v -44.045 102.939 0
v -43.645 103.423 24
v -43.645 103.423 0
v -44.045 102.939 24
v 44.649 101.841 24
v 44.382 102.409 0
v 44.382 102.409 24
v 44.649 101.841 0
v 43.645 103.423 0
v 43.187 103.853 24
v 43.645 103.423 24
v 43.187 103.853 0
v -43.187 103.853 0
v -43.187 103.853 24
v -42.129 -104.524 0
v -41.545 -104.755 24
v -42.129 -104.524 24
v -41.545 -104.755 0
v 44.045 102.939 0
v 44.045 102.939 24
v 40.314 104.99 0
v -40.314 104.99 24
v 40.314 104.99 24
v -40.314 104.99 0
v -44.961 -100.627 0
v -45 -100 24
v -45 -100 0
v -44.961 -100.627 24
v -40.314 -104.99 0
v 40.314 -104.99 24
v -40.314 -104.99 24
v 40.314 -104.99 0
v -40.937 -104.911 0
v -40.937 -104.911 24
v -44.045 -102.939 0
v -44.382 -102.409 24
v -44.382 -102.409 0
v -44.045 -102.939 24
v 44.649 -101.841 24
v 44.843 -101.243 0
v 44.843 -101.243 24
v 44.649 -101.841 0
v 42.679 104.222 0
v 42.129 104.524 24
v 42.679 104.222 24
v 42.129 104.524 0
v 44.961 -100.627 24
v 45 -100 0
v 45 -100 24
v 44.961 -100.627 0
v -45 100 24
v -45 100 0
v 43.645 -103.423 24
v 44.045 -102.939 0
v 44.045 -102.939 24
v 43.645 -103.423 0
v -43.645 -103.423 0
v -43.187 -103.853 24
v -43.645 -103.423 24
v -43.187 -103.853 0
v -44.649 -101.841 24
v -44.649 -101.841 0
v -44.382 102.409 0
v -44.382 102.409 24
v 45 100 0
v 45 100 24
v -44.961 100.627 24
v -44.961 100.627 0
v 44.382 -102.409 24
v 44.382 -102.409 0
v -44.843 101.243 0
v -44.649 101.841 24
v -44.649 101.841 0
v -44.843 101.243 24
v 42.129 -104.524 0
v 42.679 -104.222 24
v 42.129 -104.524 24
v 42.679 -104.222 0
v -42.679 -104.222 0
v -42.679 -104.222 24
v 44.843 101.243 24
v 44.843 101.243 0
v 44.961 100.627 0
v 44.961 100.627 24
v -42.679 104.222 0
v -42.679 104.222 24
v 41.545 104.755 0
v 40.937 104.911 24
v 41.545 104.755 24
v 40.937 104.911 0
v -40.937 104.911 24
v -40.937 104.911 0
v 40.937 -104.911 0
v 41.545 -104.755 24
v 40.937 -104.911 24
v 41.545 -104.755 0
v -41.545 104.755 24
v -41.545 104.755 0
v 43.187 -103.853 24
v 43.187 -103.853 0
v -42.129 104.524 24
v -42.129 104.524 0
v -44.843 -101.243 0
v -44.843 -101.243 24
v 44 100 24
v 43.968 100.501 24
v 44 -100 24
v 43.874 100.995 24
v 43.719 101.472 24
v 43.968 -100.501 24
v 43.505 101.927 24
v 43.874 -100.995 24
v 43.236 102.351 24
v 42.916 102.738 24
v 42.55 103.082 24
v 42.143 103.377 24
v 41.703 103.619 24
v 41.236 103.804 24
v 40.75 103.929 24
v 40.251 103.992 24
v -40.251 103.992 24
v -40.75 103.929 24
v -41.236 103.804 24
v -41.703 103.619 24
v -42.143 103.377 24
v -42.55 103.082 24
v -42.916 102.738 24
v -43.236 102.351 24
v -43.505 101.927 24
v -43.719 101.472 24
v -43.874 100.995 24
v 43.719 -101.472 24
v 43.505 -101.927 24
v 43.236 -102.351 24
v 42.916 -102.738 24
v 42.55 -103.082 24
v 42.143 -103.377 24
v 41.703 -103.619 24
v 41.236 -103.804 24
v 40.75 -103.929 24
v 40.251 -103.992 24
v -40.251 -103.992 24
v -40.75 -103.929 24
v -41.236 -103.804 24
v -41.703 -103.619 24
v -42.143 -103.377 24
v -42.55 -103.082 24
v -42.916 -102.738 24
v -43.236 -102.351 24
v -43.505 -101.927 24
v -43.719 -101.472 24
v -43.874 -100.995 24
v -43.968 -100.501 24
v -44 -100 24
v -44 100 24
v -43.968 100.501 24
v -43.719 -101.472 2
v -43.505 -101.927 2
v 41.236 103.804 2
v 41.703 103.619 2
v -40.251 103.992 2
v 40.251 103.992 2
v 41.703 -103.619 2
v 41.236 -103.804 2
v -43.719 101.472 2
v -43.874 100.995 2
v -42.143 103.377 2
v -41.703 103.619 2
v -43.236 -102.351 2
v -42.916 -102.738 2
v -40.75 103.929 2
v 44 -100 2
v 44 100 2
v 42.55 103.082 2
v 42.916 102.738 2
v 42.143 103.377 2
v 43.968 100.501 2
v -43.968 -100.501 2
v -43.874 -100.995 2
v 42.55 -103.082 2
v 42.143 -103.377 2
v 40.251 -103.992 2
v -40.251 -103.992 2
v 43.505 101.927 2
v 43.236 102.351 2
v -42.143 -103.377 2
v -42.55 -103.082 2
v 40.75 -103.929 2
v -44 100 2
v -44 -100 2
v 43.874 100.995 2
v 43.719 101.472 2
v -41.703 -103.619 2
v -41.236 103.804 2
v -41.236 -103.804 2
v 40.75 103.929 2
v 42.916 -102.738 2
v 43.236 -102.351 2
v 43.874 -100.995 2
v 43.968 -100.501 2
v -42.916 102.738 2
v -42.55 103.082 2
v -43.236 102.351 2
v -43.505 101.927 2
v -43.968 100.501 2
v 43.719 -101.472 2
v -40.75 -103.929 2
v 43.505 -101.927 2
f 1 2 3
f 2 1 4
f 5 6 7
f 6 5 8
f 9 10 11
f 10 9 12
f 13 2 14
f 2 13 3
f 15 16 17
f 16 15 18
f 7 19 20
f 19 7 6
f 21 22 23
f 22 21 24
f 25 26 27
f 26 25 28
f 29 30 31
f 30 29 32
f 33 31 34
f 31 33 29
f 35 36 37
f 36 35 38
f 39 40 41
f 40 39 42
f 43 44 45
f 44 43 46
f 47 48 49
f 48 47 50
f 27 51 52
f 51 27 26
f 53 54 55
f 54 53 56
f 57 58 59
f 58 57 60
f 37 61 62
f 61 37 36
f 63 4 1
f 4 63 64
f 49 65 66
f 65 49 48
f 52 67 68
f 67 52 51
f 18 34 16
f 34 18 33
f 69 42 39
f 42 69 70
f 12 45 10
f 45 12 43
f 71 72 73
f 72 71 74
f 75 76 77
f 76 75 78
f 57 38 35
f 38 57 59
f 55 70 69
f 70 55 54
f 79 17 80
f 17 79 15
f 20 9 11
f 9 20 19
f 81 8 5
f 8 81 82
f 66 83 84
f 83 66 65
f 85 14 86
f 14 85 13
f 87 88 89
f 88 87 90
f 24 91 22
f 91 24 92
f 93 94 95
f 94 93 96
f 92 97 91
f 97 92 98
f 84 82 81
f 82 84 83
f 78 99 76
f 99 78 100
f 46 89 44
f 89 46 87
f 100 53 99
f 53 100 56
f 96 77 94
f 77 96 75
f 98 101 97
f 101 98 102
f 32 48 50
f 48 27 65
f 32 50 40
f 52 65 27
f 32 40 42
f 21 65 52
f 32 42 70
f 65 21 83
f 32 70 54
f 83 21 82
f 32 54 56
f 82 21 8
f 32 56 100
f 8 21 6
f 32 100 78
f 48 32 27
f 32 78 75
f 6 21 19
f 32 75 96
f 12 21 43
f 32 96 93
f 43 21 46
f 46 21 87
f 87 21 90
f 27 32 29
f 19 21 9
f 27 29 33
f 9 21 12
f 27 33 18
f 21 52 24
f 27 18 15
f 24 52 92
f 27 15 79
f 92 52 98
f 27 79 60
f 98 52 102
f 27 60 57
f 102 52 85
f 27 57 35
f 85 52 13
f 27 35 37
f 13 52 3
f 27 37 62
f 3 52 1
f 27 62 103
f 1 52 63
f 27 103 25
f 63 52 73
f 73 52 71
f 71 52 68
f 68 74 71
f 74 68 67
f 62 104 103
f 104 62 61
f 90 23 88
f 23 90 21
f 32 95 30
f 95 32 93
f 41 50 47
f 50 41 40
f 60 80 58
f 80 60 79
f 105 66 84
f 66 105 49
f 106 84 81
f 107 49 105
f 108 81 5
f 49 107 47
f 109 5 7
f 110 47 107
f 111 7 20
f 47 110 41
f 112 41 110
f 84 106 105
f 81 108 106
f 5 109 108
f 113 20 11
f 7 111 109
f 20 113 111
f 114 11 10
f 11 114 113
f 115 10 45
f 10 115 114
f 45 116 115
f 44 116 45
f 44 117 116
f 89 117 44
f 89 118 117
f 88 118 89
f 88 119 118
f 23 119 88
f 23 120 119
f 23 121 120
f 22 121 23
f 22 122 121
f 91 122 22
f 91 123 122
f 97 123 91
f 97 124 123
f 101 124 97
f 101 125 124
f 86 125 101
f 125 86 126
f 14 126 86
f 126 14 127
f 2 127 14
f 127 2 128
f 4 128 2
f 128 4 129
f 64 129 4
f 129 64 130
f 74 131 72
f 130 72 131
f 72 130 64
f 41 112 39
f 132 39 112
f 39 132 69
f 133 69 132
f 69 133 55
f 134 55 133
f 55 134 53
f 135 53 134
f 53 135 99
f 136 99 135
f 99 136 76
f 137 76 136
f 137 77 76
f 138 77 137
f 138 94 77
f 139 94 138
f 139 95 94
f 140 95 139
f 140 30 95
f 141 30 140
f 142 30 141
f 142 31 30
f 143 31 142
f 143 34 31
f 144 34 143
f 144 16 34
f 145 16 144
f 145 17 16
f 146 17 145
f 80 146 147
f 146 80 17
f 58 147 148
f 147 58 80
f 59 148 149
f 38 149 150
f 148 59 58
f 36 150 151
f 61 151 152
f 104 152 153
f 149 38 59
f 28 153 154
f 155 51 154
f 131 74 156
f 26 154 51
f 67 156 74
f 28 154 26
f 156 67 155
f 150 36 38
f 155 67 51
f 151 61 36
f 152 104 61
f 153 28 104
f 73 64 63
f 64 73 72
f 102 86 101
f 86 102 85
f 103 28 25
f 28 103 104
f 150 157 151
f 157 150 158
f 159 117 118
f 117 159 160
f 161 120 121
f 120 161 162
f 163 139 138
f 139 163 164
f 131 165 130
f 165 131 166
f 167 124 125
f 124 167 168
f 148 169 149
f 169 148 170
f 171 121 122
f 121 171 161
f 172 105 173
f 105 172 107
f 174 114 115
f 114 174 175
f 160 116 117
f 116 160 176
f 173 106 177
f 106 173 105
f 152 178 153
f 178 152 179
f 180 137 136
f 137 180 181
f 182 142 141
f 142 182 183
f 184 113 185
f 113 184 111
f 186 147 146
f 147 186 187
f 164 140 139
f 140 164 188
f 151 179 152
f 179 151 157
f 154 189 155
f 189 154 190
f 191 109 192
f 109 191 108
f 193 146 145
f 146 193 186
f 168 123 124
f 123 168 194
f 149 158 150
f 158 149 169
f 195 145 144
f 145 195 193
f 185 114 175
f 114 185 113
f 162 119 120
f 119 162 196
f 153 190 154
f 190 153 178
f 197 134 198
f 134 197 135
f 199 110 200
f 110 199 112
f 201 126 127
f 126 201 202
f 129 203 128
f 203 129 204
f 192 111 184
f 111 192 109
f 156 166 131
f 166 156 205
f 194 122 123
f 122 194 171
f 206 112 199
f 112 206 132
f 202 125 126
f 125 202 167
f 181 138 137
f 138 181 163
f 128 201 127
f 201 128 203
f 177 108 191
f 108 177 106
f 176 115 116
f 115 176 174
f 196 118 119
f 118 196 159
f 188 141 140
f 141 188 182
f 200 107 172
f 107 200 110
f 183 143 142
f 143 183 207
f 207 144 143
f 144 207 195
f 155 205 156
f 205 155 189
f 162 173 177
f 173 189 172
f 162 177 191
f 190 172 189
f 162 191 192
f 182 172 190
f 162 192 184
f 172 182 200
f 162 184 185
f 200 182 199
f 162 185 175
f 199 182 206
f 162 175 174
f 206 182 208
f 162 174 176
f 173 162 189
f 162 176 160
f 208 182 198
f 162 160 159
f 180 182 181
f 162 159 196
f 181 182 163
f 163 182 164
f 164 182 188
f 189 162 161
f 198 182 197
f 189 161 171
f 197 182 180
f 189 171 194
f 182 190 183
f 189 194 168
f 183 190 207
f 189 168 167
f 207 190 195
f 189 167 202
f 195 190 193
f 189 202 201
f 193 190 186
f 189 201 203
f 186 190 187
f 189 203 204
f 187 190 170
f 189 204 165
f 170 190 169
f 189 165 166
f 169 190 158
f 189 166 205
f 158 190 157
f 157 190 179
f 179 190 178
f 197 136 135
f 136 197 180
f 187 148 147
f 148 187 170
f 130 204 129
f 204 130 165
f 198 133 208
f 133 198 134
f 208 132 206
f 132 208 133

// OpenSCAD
$fn = 50;


difference() {
	union() {
		hull() {
			translate(v = [-40.0000000000, 100.0000000000, 0]) {
				cylinder(h = 24, r = 5);
			}
			translate(v = [40.0000000000, 100.0000000000, 0]) {
				cylinder(h = 24, r = 5);
			}
			translate(v = [-40.0000000000, -100.0000000000, 0]) {
				cylinder(h = 24, r = 5);
			}
			translate(v = [40.0000000000, -100.0000000000, 0]) {
				cylinder(h = 24, r = 5);
			}
		}
	}
	union() {
		translate(v = [0, 0, 2]) {
			hull() {
				translate(v = [-40.0000000000, 100.0000000000, 0]) {
					cylinder(h = 22, r = 4);
				}
				translate(v = [40.0000000000, 100.0000000000, 0]) {
					cylinder(h = 22, r = 4);
				}
				translate(v = [-40.0000000000, -100.0000000000, 0]) {
					cylinder(h = 22, r = 4);
				}
				translate(v = [40.0000000000, -100.0000000000, 0]) {
					cylinder(h = 22, r = 4);
				}
			}
		}
	}
}
